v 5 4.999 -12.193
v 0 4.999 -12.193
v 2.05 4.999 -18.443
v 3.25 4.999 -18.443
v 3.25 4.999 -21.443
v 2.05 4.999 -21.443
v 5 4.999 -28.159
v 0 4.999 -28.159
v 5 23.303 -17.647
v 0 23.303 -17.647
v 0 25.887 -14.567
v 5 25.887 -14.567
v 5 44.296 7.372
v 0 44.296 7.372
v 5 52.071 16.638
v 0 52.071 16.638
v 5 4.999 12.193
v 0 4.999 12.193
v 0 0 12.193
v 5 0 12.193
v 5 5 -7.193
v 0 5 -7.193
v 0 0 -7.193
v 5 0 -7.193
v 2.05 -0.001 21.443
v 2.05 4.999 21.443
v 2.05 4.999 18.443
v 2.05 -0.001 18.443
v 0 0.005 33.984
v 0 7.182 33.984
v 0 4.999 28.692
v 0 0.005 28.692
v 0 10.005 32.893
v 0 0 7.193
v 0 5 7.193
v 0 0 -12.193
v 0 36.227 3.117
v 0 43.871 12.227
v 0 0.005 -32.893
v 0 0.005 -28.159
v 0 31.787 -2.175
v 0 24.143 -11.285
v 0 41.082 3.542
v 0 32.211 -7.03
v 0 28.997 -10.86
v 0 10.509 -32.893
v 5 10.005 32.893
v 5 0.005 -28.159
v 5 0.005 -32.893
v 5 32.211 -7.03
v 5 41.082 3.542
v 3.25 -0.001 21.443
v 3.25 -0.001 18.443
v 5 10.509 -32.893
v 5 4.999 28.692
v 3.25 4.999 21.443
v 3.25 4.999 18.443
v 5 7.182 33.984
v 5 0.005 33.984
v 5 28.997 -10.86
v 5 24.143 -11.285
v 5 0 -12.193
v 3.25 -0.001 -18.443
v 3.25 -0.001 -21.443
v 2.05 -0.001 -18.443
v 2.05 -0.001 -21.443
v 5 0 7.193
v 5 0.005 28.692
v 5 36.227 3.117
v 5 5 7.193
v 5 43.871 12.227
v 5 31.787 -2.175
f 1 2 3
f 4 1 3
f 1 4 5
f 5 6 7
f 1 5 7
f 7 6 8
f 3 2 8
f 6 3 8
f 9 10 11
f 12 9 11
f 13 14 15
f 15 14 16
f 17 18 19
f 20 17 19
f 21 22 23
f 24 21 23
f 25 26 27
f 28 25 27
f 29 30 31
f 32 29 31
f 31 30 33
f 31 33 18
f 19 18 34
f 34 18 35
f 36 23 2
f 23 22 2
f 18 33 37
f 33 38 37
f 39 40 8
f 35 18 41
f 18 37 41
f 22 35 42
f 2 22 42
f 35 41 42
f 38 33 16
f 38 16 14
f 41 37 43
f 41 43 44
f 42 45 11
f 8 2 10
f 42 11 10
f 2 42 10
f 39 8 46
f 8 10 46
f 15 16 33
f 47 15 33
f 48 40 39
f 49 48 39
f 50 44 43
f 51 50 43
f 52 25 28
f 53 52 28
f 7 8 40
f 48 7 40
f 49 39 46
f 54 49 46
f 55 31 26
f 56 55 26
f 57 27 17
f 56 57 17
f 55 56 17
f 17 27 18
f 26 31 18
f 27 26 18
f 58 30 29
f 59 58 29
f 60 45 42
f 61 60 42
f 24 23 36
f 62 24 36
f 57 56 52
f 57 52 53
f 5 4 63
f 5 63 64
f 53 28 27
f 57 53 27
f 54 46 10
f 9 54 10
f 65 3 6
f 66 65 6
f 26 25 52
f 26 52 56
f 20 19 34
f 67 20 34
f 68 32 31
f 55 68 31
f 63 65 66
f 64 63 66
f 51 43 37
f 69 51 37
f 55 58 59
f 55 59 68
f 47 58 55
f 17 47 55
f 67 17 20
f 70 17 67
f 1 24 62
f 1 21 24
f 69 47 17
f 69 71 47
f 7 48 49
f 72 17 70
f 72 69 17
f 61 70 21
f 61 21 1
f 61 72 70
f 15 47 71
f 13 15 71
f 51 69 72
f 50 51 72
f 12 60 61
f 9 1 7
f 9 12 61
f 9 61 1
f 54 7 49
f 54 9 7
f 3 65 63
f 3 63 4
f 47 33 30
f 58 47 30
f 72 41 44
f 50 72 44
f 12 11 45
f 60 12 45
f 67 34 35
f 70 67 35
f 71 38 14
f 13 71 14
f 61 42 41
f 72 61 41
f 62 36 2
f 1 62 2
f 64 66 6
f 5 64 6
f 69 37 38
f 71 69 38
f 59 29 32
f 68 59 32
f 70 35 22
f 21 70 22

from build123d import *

# Parameters (mm, degrees)
BOSS_EXTRUDE2_DEPTH = 5
BOSS_EXTRUDE3_START = 2.05
SKETCH2_4_W         = 3
SKETCH2_4_H         = 5
BOSS_EXTRUDE3_DEPTH = 1.2


with BuildPart() as part:
    # Sketch2 → Boss-Extrude2 (new body)
    with BuildSketch(Plane(origin=(0, 0, 0), x_dir=(0, 0, -1), z_dir=(1, 0, 0))):
        Polygon((7.192857145, 5.102e-06), (12.192857145, 5.102e-06), (12.192857145, 4.998838637), (18.442857145, 4.998838637), (21.442857145, 4.998838637), (27.892857145, 4.998838637), (28.158909208, 4.998838637), (28.158909208, 0.00505468), (32.892857145, 0.00505468), (32.892857145, 10.509453346), (17.646665318, 23.302527285), (14.567046792, 25.886634054), (10.859778292, 28.997401685), (11.284525034, 24.142524207), (2.174678599, 31.786592991), (7.029556077, 32.211339733), (-3.541857238, 41.081808747), (-3.117110496, 36.226931269), (-12.226956931, 43.871000053), (-7.372079454, 44.295746795), (-16.638484456, 52.071183815), (-32.892857145, 10.00505468), (-33.983618254, 7.182177505), (-33.983618254, 0.00505468), (-32.892857145, 0.00505468), (-28.691927734, 0.00505468), (-28.691927734, 4.998838637), (-27.892857145, 4.998838637), (-21.442857145, 4.998838637), (-18.442857145, 4.998838637), (-12.192857145, 4.998838637), (-12.192857145, 4.163e-06), (-7.192857145, 4.163e-06), (-7.192857145, 5.000004163), (7.192857145, 5.000004163), align=None)
    extrude(amount=BOSS_EXTRUDE2_DEPTH)

    # Sketch2<4> → Boss-Extrude3 (add)
    with BuildSketch(Plane(origin=(0, 0, 0), x_dir=(0, 0, -1), z_dir=(1, 0, 0)).offset(BOSS_EXTRUDE3_START)):
        with Locations((19.942857145, 2.498838637)):
            Rectangle(SKETCH2_4_W, SKETCH2_4_H)
        with Locations((-19.942857145, 2.498838637)):
            Rectangle(SKETCH2_4_W, SKETCH2_4_H)
    extrude(amount=BOSS_EXTRUDE3_DEPTH)


solid = part.part
